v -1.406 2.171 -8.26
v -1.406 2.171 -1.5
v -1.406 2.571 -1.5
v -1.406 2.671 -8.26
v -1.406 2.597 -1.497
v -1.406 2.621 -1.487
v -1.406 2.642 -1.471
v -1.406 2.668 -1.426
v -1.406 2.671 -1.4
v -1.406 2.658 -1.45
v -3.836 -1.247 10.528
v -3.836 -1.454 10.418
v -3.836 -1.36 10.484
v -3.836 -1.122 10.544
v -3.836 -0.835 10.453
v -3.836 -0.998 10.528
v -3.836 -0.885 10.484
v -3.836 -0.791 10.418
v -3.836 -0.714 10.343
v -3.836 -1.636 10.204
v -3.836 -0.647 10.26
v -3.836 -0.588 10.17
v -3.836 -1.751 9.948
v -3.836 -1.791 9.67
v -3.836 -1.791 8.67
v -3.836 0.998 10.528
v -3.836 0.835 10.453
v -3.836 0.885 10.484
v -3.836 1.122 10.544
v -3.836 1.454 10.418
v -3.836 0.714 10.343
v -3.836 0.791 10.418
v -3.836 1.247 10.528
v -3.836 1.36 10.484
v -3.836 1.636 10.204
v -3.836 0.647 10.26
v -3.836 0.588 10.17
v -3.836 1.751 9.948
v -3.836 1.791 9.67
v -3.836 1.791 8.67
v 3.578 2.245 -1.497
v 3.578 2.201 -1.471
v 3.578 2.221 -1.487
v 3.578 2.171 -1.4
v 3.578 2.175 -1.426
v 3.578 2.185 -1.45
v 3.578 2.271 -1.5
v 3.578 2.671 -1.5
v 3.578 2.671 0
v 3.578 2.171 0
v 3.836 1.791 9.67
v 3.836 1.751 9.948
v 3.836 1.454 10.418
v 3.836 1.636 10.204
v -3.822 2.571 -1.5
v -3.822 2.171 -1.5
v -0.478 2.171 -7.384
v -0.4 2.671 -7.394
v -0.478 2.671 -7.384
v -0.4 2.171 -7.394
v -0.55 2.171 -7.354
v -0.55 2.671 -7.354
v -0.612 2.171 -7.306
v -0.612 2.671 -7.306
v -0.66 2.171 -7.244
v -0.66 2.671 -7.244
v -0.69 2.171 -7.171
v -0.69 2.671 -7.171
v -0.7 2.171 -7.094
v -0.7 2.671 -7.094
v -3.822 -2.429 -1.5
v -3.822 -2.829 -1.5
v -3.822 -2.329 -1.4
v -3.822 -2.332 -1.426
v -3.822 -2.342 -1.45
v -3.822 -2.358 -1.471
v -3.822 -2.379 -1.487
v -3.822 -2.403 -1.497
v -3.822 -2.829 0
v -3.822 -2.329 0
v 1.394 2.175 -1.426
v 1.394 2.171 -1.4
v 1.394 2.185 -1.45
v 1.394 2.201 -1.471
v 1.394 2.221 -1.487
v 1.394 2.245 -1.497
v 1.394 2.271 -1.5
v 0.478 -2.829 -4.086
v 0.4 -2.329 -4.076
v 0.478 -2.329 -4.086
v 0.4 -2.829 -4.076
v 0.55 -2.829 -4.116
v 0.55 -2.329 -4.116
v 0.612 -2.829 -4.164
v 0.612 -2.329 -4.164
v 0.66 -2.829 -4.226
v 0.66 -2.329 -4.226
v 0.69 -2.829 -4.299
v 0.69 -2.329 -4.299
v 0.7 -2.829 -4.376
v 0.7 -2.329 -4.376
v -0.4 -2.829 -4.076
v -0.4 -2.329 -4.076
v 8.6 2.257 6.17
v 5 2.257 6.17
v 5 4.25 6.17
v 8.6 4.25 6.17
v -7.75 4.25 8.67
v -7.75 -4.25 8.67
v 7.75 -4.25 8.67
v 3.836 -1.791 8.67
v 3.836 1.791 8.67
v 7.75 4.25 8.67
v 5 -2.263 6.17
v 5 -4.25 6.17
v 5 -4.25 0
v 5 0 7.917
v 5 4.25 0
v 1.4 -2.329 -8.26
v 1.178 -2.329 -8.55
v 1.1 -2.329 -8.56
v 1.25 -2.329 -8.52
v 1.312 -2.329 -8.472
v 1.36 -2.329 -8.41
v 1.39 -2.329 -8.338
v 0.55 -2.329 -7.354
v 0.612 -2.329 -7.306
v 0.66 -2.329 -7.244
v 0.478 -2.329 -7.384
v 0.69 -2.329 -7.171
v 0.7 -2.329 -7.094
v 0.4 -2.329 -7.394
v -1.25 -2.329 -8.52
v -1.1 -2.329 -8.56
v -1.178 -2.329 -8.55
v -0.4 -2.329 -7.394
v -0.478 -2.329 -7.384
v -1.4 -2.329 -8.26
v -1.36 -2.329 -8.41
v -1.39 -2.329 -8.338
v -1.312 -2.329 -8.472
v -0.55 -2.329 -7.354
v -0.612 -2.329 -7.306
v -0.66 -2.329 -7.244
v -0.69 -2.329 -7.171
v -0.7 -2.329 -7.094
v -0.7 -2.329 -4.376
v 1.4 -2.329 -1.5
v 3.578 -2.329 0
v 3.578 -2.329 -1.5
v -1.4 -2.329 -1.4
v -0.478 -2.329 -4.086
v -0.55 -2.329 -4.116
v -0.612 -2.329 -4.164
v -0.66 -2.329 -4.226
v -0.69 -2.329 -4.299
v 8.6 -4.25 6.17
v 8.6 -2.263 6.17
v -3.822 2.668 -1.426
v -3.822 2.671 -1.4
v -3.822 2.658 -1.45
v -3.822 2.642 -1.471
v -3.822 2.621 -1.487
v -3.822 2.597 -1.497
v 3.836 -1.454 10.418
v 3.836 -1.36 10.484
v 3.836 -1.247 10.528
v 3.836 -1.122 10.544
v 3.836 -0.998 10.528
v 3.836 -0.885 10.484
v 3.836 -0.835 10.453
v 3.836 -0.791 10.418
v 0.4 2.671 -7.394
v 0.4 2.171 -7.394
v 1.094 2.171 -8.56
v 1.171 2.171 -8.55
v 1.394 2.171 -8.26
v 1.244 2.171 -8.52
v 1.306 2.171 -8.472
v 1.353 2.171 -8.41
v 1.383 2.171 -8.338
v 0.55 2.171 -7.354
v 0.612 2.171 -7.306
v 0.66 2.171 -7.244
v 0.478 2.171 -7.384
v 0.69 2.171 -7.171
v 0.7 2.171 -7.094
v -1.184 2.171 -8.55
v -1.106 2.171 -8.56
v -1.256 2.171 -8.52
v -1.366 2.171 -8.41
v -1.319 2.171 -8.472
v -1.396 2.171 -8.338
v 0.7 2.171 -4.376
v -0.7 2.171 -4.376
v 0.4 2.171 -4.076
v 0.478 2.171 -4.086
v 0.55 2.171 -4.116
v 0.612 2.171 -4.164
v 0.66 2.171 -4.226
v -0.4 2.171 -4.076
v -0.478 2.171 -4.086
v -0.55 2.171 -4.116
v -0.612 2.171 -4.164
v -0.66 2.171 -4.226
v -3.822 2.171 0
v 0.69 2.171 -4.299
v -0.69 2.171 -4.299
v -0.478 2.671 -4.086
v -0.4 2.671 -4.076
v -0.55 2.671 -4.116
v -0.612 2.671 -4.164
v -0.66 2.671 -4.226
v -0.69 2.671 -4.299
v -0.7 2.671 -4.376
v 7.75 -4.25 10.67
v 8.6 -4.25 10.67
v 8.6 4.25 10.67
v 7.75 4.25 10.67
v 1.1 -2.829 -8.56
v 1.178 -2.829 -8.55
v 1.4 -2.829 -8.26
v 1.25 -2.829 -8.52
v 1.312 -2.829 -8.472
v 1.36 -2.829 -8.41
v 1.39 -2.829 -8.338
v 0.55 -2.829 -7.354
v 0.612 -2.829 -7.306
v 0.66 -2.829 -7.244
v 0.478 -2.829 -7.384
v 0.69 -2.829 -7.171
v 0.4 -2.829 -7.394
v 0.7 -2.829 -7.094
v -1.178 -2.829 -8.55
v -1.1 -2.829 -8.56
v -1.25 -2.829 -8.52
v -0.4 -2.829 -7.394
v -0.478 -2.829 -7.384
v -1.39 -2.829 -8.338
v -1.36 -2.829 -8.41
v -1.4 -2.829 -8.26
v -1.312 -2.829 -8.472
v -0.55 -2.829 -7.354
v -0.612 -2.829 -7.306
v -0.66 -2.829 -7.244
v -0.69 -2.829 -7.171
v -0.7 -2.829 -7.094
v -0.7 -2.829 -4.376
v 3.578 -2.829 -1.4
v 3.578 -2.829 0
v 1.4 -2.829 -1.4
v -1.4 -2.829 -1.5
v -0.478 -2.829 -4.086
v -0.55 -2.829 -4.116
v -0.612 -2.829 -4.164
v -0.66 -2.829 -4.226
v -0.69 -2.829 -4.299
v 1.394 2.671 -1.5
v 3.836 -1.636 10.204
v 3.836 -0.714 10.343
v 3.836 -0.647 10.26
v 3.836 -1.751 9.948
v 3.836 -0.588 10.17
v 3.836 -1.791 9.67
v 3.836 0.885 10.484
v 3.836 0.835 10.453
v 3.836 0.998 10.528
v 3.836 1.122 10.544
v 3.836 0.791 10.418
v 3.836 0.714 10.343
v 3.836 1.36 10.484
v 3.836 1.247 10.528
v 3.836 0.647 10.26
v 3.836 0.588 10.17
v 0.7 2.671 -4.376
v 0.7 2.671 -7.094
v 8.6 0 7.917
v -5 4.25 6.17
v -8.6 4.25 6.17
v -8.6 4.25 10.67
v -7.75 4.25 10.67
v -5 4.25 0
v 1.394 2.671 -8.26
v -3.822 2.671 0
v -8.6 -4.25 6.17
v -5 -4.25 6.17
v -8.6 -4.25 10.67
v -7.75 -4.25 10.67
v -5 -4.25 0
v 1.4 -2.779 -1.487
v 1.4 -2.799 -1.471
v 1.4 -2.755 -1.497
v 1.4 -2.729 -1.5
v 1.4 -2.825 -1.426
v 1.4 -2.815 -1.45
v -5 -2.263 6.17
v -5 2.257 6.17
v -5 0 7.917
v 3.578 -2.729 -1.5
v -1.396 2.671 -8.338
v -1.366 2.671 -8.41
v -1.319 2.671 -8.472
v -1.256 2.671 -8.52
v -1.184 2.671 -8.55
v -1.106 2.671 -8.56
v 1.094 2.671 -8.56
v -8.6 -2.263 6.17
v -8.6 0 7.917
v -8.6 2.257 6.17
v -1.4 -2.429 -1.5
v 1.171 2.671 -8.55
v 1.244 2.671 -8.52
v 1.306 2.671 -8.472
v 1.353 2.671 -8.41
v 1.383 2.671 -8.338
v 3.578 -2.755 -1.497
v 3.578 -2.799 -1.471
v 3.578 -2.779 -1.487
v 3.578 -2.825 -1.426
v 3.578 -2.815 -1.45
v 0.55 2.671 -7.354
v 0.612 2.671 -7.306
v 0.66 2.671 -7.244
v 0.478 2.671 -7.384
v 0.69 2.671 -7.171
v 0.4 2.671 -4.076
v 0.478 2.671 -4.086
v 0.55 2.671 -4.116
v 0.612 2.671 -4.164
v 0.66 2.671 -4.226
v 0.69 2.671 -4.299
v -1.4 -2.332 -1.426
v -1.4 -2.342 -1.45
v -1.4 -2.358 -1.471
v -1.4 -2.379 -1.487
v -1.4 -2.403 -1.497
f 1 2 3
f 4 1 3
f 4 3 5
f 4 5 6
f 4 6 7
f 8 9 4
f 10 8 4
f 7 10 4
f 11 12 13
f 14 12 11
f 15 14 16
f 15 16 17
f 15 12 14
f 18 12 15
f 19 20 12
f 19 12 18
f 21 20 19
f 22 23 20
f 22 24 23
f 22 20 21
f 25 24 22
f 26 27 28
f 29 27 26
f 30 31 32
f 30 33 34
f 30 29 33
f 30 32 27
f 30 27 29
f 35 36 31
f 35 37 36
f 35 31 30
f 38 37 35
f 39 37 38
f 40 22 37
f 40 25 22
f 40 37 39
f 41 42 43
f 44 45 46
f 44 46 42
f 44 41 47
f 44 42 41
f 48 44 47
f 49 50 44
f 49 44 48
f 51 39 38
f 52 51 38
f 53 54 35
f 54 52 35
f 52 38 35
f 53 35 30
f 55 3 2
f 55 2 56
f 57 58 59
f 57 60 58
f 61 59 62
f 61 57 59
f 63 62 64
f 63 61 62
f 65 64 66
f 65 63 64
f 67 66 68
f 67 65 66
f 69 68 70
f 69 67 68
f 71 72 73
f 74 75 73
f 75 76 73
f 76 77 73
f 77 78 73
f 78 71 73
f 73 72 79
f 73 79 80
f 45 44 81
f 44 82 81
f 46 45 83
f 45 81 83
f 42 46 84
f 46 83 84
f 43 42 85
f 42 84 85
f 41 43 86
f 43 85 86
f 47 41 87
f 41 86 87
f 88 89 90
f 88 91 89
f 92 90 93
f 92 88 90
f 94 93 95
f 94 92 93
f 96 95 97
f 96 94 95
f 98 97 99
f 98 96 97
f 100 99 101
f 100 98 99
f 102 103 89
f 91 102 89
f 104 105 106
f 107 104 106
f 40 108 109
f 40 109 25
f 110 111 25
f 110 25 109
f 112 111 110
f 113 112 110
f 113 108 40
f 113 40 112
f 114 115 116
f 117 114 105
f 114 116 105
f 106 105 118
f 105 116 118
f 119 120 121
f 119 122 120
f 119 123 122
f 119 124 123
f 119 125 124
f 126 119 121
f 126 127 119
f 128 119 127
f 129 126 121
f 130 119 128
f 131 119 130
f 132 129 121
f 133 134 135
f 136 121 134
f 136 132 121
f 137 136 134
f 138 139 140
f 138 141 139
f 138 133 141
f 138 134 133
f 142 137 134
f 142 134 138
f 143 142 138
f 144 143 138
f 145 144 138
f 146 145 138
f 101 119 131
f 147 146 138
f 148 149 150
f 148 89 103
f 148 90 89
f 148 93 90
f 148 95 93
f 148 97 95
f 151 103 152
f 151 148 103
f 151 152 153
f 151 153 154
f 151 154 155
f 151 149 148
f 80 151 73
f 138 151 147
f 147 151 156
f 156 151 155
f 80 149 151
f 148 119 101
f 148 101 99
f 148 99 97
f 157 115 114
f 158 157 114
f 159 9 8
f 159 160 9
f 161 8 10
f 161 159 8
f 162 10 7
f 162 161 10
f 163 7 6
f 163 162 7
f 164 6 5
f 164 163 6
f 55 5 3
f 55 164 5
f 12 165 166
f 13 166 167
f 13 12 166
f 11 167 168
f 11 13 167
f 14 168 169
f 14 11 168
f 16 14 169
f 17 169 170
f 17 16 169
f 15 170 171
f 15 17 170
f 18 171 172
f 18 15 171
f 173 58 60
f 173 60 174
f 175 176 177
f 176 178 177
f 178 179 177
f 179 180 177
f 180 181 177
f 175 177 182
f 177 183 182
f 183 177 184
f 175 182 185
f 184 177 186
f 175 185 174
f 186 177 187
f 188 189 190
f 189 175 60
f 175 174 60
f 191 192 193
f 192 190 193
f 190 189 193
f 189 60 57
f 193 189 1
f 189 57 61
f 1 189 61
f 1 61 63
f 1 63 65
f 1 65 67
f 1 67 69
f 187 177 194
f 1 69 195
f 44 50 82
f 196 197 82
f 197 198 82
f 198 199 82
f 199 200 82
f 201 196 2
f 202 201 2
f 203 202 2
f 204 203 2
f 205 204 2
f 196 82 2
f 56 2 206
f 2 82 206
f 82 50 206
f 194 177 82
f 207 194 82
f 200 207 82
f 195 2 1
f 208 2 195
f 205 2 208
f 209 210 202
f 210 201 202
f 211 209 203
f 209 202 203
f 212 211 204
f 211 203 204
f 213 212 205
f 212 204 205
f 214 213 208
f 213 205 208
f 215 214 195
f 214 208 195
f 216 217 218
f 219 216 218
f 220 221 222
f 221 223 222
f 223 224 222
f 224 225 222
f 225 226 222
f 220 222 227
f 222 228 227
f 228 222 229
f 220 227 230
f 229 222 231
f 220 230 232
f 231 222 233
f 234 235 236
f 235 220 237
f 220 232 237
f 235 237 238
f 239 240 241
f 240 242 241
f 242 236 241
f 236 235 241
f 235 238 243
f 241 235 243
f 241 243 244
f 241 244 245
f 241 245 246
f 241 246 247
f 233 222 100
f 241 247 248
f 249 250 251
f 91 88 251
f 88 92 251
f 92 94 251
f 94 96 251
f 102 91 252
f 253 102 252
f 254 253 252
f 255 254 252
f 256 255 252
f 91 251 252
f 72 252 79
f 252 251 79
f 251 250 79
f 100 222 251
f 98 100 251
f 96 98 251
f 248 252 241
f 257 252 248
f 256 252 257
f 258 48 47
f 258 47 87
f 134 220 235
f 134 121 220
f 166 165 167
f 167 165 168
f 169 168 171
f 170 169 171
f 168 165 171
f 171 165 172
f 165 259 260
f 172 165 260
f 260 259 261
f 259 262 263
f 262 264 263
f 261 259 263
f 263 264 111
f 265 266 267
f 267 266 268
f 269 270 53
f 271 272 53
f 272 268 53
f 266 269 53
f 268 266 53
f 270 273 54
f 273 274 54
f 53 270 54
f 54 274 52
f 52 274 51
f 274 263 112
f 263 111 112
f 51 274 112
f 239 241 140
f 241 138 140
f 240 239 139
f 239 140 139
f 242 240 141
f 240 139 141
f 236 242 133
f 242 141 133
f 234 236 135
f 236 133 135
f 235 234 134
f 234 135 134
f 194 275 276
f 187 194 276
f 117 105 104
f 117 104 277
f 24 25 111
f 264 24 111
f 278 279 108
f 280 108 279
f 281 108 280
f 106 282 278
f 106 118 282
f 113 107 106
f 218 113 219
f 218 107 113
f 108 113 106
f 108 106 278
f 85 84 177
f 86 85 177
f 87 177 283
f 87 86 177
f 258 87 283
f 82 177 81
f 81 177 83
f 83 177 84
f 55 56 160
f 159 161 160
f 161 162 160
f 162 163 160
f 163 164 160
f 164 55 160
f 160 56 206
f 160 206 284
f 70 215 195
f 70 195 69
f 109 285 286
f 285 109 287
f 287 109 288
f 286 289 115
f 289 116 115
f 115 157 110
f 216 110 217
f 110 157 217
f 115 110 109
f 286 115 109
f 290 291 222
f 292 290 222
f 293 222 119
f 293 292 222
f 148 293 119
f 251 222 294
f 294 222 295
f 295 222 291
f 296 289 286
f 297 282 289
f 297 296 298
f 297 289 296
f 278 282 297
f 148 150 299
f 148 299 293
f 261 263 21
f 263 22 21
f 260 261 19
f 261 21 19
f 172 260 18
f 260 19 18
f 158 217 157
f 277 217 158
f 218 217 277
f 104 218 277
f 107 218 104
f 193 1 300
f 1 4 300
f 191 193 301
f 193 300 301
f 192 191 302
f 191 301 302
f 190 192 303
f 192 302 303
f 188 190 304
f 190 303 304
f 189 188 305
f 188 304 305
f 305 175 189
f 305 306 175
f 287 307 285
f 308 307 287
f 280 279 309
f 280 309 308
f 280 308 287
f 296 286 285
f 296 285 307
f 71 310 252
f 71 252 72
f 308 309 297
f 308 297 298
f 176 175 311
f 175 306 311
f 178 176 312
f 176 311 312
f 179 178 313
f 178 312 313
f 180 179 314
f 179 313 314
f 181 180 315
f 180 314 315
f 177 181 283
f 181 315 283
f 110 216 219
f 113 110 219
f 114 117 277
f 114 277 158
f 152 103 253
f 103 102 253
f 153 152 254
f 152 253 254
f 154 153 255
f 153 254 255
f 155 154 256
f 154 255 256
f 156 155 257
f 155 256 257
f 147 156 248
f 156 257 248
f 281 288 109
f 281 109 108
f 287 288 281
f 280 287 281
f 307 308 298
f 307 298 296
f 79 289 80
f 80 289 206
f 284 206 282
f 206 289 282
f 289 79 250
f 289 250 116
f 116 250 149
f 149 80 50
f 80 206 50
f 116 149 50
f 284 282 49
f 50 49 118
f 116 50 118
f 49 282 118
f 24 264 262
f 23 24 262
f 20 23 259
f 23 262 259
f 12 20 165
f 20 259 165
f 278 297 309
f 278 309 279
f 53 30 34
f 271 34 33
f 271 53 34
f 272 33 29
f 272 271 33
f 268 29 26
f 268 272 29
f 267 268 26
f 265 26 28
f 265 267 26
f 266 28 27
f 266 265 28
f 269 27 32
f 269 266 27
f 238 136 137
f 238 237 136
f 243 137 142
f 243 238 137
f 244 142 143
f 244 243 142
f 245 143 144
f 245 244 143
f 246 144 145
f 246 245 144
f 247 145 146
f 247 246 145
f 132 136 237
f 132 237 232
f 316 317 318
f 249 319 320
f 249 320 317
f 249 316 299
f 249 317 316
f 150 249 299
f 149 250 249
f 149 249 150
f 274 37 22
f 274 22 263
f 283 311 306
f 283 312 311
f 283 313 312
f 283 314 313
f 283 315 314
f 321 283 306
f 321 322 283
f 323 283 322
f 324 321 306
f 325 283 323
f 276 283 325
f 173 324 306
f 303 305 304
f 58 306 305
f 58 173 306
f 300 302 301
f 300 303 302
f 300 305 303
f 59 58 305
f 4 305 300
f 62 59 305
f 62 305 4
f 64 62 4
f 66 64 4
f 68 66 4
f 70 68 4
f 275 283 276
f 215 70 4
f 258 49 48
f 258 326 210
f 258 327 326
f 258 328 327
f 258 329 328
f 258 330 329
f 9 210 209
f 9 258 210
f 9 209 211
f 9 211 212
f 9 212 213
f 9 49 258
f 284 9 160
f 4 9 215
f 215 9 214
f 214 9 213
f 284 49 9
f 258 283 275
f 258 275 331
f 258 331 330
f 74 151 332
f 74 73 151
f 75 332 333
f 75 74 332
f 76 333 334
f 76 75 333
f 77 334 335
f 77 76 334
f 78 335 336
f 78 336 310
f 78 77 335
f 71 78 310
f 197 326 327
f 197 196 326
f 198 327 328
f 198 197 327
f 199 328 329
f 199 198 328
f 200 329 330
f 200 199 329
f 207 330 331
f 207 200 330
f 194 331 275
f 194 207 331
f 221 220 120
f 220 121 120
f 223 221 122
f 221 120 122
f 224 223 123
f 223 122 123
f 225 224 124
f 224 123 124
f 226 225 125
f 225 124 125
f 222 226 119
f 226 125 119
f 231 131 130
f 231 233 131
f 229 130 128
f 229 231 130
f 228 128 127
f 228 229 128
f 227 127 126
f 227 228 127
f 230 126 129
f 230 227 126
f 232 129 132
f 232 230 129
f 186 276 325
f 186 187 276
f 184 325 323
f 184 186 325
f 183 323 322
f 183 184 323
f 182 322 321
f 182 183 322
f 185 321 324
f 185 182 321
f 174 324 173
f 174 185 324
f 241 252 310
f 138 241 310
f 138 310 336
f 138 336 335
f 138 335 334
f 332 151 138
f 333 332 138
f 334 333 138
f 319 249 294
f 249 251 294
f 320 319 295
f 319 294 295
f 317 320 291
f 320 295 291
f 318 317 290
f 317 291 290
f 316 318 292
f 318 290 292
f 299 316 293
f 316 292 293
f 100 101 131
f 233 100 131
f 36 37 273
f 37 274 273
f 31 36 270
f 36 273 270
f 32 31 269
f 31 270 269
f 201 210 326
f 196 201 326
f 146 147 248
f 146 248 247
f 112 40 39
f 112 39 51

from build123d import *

# Parameters (mm, degrees)
SKETCH1_W           = 10
SKETCH1_H           = 8.5
BOSS_EXTRUDE1_DEPTH = 10.67
SKETCH2_W           = 7.4
SKETCH2_H           = 0.5
BOSS_EXTRUDE2_DEPTH = 1.5
SKETCH3_W           = 2.8
SKETCH3_H           = 0.5
BOSS_EXTRUDE3_DEPTH = 7.06
FILLET4_R           = 0.1
SKETCH5_W           = 4.5
SKETCH5_H           = 8.5
BOSS_EXTRUDE4_DEPTH = 3.6
SKETCH6_W           = 4.5
SKETCH6_H           = 8.5
BOSS_EXTRUDE5_DEPTH = 3.6
CUT_EXTRUDE2_START  = -17.2
CUT_EXTRUDE2_DEPTH  = 17.2
BOSS_EXTRUDE6_DEPTH = 10
SKETCH9_W           = 15.5
SKETCH9_H           = 8.5
CUT_EXTRUDE3_DEPTH  = 2
SKETCH10_W          = 7.671768302
SKETCH10_H          = 3.58137051
BOSS_EXTRUDE7_DEPTH = 2
SKETCH12_W          = 7.671768302
SKETCH12_H          = 1.176323548
CUT_EXTRUDE4_DEPTH  = 0.5
FILLET7_R           = 1
FILLET8_R           = 0.5
SKETCH13_W          = 1.4
SKETCH13_H          = 3.317554906
CUT_EXTRUDE5_DEPTH  = 10
FILLET9_R           = 0.3


with BuildPart() as part:
    # Sketch1 → Boss-Extrude1 (new body)
    with BuildSketch(Plane.XY):
        Rectangle(SKETCH1_W, SKETCH1_H)
    extrude(amount=BOSS_EXTRUDE1_DEPTH)

    # Sketch2 → Boss-Extrude2 (add)
    with BuildSketch(Plane(origin=(0, 0, 0), x_dir=(-1, 0, 0), z_dir=(0, 0, -1))):
        with Locations((0.121950207, -2.578749491)):
            Rectangle(SKETCH2_W, SKETCH2_H)
        with Locations((0.121950207, 2.421250509)):
            Rectangle(SKETCH2_W, SKETCH2_H)
    extrude(amount=BOSS_EXTRUDE2_DEPTH)

    # Sketch3 → Boss-Extrude3 (add)
    with BuildSketch(Plane(origin=(0, 0, -1.5), x_dir=(-1, 0, 0), z_dir=(0, 0, -1))):
        with Locations((0, -2.578749491)):
            Rectangle(SKETCH3_W, SKETCH3_H)
        with Locations((0.006424345, 2.421250509)):
            Rectangle(SKETCH3_W, SKETCH3_H)
    extrude(amount=BOSS_EXTRUDE3_DEPTH)

    # Fillet4
    fillet4_edges = [part.edges().sort_by_distance(p)[0] for p in [
        (2.489024896, -2.828749491, -1.5),
        (-2.610975104, -2.328749491, -1.5),
        (-2.614187276, 2.671250509, -1.5),
        (2.485812724, 2.171250509, -1.5),
    ]]
    fillet(fillet4_edges, radius=FILLET4_R)

    # Sketch5 → Boss-Extrude4 (add)
    with BuildSketch(Plane(origin=(5, 0, 0), x_dir=(0, 0, -1), z_dir=(1, 0, 0))):
        with Locations((-8.42, 0)):
            Rectangle(SKETCH5_W, SKETCH5_H)
    extrude(amount=BOSS_EXTRUDE4_DEPTH)

    # Sketch6 → Boss-Extrude5 (add)
    with BuildSketch(Plane.ZY.offset(5)):
        with Locations((8.42, 0)):
            Rectangle(SKETCH6_W, SKETCH6_H)
    extrude(amount=BOSS_EXTRUDE5_DEPTH)

    # Sketch7 → Cut-Extrude2 (cut)
    with BuildSketch(Plane(origin=(8.6, 0, 0), x_dir=(0, 0, -1), z_dir=(1, 0, 0)).offset(CUT_EXTRUDE2_START)):
        Polygon((-6.17, 2.257266115), (-7.916888321, -4.993e-06), (-6.17, -2.262882433), align=None)
    cut_extrude2 = extrude(amount=CUT_EXTRUDE2_DEPTH, mode=Mode.SUBTRACT)

    # Mirror2: Cut-Extrude2 across plane
    add(cut_extrude2.mirror(Plane(origin=(0, 0, 0), x_dir=(0, 0, 1), z_dir=(1, 0, 0))), mode=Mode.SUBTRACT)

    # Sketch8 → Boss-Extrude6 (add)
    with BuildSketch(Plane(origin=(5, 0, 0), x_dir=(0, 0, -1), z_dir=(1, 0, 0))):
        Polygon((-6.17, -2.262882433), (-7.916892176, 0), (-6.17, 2.257266115), align=None)
    extrude(amount=-BOSS_EXTRUDE6_DEPTH)

    # Sketch9 → Cut-Extrude3 (cut)
    with BuildSketch(Plane.XY.offset(10.67)):
        Rectangle(SKETCH9_W, SKETCH9_H)
    extrude(amount=-CUT_EXTRUDE3_DEPTH, mode=Mode.SUBTRACT)

    # Sketch10 → Boss-Extrude7 (add)
    with BuildSketch(Plane.XY.offset(8.67)):
        Rectangle(SKETCH10_W, SKETCH10_H)
    extrude(amount=BOSS_EXTRUDE7_DEPTH)

    # Sketch12 → Cut-Extrude4 (cut)
    with BuildSketch(Plane.XY.offset(10.67)):
        Rectangle(SKETCH12_W, SKETCH12_H)
    extrude(amount=-CUT_EXTRUDE4_DEPTH, mode=Mode.SUBTRACT)

    # Fillet7
    # the kernel refuses this fillet: 1 mm, written as the material it takes off along each edge
    with BuildSketch(Plane(origin=(6.00094766, 0.588161774, 10.67), x_dir=(0, 1, 0), z_dir=(-1, 0, 0))) as fillet7_piece_1:
        with BuildLine():
            CenterArc((0.866025404, 1), FILLET7_R, 210, 60)
            Line((0, 0.5), (-0.017320508, 0.49))
            ThreePointArc((-0.017320508, 0.49), (-0.02, 0.25), (-0.02, 0))
            Line((-0.02, 0), (0, -0.02))
            Line((0, -0.02), (0.866025404, -0.02))
            Line((0.866025404, -0.02), (0.866025404, 0))
        make_face()
    extrude(amount=12.001895321, mode=Mode.SUBTRACT)
    with BuildSketch(Plane(origin=(-6.00094766, -0.588161774, 10.67), x_dir=(0, 0, -1), z_dir=(1, 0, 0))) as fillet7_piece_2:
        with BuildLine():
            CenterArc((1, -0.866025404), FILLET7_R, 120, 60)
            Line((0, -0.866025404), (-0.02, -0.866025404))
            Line((-0.02, -0.866025404), (-0.02, 0))
            Line((-0.02, 0), (0, 0.02))
            ThreePointArc((0, 0.02), (0.25, 0.02), (0.49, 0.017320508))
            Line((0.49, 0.017320508), (0.5, 0))
        make_face()
    extrude(amount=12.001895321, mode=Mode.SUBTRACT)
    with BuildSketch(Plane(origin=(6.335884151, -1.790685255, 10.67), x_dir=(0, 0, -1), z_dir=(-1, 0, 0)), Plane(origin=(-6.335884151, 1.790685255, 10.67), x_dir=(0, 0, -1), z_dir=(1, 0, 0))) as fillet7_piece_3:
        with BuildLine():
            CenterArc((FILLET7_R, -FILLET7_R), FILLET7_R, 90, 90)
            Line((0, -FILLET7_R), (-FILLET7_R * 0.02, -FILLET7_R))
            Line((-FILLET7_R * 0.02, -FILLET7_R), (-FILLET7_R * 0.02, FILLET7_R * 0.02))
            Line((-FILLET7_R * 0.02, FILLET7_R * 0.02), (FILLET7_R, FILLET7_R * 0.02))
            Line((FILLET7_R, FILLET7_R * 0.02), (FILLET7_R, 0))
        make_face()
    extrude(amount=12.671768302, mode=Mode.SUBTRACT)

    # Fillet8
    fillet8_edges = [part.edges().sort_by_distance(p)[0] for p in [
        (0, 1.122436216, 10.613367002),
        (0, -1.122436216, 10.613367002),
    ]]
    fillet(fillet8_edges, radius=FILLET8_R)

    # Sketch13 → Cut-Extrude5 (cut)
    with BuildSketch(Plane(origin=(0, 2.671250509, 0), x_dir=(1, 0, 0), z_dir=(0, 1, 0))):
        with Locations((0, 5.735027383)):
            Rectangle(SKETCH13_W, SKETCH13_H)
    extrude(amount=-CUT_EXTRUDE5_DEPTH, mode=Mode.SUBTRACT)

    # Fillet9
    fillet9_edges = [part.edges().sort_by_distance(p)[0] for p in [
        (0.7, -2.578749491, -7.393804836),
        (0.7, 2.421250509, -7.393804836),
        (0.7, -2.578749491, -4.07624993),
        (0.7, 2.421250509, -4.07624993),
        (-0.7, -2.578749491, -4.07624993),
        (-0.7, 2.421250509, -4.07624993),
        (-0.7, -2.578749491, -7.393804836),
        (-0.7, 2.421250509, -7.393804836),
        (1.4, -2.578749491, -8.56),
        (-1.4, -2.578749491, -8.56),
        (1.393575655, 2.421250509, -8.56),
        (-1.406424345, 2.421250509, -8.56),
    ]]
    fillet(fillet9_edges, radius=FILLET9_R)


solid = part.part
